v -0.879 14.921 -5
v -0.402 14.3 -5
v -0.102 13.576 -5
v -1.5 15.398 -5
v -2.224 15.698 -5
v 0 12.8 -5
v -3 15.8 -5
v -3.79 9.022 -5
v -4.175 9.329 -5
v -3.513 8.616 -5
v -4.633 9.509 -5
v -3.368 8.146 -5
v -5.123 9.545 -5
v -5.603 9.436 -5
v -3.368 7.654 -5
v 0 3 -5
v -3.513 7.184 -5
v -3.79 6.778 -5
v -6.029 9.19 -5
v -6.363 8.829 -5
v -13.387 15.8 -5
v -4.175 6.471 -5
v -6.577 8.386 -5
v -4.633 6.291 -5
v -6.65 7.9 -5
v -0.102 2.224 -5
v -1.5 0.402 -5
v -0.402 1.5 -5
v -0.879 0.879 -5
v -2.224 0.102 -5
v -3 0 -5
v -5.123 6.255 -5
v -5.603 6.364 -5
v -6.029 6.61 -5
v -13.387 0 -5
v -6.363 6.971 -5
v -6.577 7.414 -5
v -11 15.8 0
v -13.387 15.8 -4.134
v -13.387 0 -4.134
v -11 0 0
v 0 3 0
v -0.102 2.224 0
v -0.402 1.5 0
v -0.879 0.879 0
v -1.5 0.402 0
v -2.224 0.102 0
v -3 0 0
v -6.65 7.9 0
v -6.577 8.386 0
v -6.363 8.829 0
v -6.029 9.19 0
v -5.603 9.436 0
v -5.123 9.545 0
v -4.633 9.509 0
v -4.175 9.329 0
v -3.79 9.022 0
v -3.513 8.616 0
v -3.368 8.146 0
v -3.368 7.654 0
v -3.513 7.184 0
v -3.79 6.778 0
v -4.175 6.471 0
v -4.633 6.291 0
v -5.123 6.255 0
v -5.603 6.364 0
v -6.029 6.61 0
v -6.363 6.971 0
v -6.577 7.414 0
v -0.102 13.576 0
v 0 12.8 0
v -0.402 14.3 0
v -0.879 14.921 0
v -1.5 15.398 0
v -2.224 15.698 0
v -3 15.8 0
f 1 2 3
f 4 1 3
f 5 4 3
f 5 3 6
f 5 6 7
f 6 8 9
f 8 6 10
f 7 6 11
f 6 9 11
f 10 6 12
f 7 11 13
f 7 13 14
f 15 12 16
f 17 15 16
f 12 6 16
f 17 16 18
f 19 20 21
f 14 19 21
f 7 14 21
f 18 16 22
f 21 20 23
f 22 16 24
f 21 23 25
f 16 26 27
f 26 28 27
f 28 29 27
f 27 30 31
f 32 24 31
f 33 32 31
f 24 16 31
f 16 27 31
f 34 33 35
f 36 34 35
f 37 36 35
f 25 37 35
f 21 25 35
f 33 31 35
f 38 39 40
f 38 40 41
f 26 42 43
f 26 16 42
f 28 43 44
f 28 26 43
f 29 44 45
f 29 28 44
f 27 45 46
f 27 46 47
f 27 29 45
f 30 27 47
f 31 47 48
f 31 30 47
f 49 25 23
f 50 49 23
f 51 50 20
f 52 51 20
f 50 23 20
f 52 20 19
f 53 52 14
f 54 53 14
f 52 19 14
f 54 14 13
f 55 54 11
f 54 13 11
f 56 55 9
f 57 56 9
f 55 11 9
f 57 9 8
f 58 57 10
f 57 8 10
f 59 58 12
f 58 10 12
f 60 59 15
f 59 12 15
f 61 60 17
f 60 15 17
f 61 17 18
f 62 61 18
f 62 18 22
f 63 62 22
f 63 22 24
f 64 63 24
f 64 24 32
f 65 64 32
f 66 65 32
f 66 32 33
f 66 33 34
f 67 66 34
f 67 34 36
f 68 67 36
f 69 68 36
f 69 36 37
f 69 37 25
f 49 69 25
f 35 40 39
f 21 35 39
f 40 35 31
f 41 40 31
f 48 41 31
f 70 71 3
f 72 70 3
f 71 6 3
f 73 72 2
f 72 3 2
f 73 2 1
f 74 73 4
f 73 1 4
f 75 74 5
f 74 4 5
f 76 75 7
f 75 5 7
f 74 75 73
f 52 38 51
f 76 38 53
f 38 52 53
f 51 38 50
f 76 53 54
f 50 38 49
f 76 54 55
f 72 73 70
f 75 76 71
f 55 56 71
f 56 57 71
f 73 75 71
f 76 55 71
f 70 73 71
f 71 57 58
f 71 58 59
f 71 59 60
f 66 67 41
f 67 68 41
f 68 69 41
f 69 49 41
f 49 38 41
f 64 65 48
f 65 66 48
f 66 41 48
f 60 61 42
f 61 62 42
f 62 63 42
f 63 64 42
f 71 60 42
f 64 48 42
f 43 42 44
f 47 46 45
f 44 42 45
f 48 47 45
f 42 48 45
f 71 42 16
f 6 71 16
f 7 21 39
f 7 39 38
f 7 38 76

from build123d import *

# Parameters (mm, degrees)
EXTRUDE_1_DEPTH = 15.8
FILLET_1_R      = 3
M4X0_71_D       = 3.3
CHAMFER_1_SIZE  = 0.5
CHAMFER_1_SIZE2 = 1


with BuildPart() as part:
    # Эскиз1 → Бобышка-Вытянуть1 (new body)
    with BuildSketch(Plane(origin=(0, 0, 0), x_dir=(1, 0, 0), z_dir=(0, 1, 0))):
        Polygon((0, 0), (0, 5), (-13.886751346, 5), (-11, 0), align=None)
    extrude(amount=EXTRUDE_1_DEPTH)

    # Скругление1
    fillet_1_edges = [part.edges().sort_by_distance(p)[0] for p in [
        (0, 0, -2.5),
        (0, 15.8, -2.5),
    ]]
    fillet(fillet_1_edges, radius=FILLET_1_R)

    # Отверстие обработанное метчиком M4x0.71 (through all)
    with Locations(Plane.XY):
        with Locations((-5, 7.9)):
            Hole(M4X0_71_D / 2)

    # Фаска1
    chamfer_1_edges = [part.edges().sort_by_distance(p)[0] for p in [
        (-13.886751346, 7.9, -5),
    ]]
    chamfer_1_side = [part.faces().sort_by_distance(p)[0] for p in [
        (-7.140744189, 7.9, -5),
    ]]
    chamfer(chamfer_1_edges, length=CHAMFER_1_SIZE, length2=CHAMFER_1_SIZE2, reference=chamfer_1_side[0])


solid = part.part
